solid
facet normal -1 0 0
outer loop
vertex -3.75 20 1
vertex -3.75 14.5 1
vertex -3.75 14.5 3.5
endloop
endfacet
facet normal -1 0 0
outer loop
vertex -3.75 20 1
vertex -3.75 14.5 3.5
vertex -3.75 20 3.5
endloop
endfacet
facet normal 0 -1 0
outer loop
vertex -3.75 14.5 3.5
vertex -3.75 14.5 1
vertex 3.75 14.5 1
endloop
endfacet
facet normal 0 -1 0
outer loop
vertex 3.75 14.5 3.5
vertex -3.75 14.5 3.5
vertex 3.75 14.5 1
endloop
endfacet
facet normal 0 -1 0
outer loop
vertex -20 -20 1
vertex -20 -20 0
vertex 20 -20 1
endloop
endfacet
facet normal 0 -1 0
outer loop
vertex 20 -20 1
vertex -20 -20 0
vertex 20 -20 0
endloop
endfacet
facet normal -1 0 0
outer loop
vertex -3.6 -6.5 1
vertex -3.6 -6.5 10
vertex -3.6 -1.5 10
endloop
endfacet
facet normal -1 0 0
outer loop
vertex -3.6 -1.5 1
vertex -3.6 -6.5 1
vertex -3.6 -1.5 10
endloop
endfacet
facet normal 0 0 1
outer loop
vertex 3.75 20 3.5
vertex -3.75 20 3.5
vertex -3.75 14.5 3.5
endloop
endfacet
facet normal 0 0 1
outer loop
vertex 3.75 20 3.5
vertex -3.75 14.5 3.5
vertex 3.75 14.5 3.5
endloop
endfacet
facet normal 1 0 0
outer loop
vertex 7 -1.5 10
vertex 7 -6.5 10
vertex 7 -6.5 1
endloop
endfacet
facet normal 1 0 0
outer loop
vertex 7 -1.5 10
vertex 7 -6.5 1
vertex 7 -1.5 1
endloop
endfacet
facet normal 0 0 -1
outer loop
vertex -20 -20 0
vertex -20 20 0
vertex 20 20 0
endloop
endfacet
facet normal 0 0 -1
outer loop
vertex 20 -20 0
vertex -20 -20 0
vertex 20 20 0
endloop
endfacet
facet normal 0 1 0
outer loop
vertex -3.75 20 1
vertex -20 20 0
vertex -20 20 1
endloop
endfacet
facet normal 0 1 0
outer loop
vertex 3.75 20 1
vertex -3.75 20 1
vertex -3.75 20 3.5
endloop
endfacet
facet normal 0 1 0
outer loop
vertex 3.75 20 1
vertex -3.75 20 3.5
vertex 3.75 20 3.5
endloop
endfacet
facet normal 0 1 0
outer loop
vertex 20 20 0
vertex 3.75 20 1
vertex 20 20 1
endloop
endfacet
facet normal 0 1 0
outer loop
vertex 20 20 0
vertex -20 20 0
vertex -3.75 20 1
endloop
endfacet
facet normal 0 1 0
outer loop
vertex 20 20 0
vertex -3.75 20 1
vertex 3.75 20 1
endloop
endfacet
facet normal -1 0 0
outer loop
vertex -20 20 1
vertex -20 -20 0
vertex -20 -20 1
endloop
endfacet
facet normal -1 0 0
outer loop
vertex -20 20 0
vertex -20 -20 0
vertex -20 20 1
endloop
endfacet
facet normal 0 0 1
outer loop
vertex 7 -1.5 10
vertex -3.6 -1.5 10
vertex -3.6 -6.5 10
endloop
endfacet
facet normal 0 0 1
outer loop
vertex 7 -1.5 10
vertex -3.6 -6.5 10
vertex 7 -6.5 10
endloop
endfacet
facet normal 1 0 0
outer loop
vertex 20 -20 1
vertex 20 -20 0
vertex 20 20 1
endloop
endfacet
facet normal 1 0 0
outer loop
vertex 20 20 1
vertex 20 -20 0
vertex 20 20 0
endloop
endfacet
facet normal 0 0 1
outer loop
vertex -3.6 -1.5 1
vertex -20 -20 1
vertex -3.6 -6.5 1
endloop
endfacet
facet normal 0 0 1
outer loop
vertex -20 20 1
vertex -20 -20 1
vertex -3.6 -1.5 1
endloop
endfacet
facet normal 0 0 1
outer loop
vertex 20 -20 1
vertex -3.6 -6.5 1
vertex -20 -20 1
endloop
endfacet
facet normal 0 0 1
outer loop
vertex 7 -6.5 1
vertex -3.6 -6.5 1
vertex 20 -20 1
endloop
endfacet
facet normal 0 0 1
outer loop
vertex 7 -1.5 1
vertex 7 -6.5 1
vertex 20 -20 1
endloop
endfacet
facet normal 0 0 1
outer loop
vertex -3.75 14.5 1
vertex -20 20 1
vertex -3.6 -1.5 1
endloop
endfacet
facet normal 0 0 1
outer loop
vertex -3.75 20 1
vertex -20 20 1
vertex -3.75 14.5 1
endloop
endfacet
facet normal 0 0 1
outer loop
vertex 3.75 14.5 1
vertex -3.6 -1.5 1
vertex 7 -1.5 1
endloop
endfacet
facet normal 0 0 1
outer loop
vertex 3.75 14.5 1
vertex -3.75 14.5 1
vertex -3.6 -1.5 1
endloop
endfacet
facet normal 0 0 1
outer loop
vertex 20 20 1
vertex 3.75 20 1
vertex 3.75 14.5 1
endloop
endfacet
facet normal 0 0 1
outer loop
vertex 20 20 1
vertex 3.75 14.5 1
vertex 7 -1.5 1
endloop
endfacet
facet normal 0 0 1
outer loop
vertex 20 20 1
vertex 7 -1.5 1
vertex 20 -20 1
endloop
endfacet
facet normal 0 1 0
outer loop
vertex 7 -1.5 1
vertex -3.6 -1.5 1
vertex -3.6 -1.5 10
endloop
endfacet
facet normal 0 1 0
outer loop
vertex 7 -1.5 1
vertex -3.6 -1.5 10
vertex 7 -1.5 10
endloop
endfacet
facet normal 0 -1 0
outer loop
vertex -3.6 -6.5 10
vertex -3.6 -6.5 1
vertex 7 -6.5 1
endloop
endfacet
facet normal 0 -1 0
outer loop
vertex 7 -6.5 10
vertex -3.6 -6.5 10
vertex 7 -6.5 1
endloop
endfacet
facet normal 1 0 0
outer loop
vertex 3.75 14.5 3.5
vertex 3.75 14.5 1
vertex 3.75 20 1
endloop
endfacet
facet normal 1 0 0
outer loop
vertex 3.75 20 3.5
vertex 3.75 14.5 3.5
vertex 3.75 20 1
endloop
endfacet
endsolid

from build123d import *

# Parameters (mm, degrees)
F0_W     = 40
F0_H     = 40
F1_DEPTH = 1
F2_W     = 10.6
F2_H     = 5
F3_DEPTH = 9
F2_W_2   = 7.5
F2_H_2   = 5.5
F4_DEPTH = 2.5


with BuildPart() as f1:
    # F0 (on Top) → F1 (new body)
    with BuildSketch(Plane.XY):
        Rectangle(F0_W, F0_H)
    extrude(amount=F1_DEPTH)

    # F2 (on face) → F3 (join)
    with BuildSketch(Plane.XY.offset(1)):
        with Locations((1.7, -4)):
            Rectangle(F2_W, F2_H)
    extrude(amount=F3_DEPTH)

    # F2 (on face) → F4 (join)
    with BuildSketch(Plane.XY.offset(1)):
        with Locations((0, 17.25)):
            Rectangle(F2_W_2, F2_H_2)
    extrude(amount=F4_DEPTH)


solid = f1.part
